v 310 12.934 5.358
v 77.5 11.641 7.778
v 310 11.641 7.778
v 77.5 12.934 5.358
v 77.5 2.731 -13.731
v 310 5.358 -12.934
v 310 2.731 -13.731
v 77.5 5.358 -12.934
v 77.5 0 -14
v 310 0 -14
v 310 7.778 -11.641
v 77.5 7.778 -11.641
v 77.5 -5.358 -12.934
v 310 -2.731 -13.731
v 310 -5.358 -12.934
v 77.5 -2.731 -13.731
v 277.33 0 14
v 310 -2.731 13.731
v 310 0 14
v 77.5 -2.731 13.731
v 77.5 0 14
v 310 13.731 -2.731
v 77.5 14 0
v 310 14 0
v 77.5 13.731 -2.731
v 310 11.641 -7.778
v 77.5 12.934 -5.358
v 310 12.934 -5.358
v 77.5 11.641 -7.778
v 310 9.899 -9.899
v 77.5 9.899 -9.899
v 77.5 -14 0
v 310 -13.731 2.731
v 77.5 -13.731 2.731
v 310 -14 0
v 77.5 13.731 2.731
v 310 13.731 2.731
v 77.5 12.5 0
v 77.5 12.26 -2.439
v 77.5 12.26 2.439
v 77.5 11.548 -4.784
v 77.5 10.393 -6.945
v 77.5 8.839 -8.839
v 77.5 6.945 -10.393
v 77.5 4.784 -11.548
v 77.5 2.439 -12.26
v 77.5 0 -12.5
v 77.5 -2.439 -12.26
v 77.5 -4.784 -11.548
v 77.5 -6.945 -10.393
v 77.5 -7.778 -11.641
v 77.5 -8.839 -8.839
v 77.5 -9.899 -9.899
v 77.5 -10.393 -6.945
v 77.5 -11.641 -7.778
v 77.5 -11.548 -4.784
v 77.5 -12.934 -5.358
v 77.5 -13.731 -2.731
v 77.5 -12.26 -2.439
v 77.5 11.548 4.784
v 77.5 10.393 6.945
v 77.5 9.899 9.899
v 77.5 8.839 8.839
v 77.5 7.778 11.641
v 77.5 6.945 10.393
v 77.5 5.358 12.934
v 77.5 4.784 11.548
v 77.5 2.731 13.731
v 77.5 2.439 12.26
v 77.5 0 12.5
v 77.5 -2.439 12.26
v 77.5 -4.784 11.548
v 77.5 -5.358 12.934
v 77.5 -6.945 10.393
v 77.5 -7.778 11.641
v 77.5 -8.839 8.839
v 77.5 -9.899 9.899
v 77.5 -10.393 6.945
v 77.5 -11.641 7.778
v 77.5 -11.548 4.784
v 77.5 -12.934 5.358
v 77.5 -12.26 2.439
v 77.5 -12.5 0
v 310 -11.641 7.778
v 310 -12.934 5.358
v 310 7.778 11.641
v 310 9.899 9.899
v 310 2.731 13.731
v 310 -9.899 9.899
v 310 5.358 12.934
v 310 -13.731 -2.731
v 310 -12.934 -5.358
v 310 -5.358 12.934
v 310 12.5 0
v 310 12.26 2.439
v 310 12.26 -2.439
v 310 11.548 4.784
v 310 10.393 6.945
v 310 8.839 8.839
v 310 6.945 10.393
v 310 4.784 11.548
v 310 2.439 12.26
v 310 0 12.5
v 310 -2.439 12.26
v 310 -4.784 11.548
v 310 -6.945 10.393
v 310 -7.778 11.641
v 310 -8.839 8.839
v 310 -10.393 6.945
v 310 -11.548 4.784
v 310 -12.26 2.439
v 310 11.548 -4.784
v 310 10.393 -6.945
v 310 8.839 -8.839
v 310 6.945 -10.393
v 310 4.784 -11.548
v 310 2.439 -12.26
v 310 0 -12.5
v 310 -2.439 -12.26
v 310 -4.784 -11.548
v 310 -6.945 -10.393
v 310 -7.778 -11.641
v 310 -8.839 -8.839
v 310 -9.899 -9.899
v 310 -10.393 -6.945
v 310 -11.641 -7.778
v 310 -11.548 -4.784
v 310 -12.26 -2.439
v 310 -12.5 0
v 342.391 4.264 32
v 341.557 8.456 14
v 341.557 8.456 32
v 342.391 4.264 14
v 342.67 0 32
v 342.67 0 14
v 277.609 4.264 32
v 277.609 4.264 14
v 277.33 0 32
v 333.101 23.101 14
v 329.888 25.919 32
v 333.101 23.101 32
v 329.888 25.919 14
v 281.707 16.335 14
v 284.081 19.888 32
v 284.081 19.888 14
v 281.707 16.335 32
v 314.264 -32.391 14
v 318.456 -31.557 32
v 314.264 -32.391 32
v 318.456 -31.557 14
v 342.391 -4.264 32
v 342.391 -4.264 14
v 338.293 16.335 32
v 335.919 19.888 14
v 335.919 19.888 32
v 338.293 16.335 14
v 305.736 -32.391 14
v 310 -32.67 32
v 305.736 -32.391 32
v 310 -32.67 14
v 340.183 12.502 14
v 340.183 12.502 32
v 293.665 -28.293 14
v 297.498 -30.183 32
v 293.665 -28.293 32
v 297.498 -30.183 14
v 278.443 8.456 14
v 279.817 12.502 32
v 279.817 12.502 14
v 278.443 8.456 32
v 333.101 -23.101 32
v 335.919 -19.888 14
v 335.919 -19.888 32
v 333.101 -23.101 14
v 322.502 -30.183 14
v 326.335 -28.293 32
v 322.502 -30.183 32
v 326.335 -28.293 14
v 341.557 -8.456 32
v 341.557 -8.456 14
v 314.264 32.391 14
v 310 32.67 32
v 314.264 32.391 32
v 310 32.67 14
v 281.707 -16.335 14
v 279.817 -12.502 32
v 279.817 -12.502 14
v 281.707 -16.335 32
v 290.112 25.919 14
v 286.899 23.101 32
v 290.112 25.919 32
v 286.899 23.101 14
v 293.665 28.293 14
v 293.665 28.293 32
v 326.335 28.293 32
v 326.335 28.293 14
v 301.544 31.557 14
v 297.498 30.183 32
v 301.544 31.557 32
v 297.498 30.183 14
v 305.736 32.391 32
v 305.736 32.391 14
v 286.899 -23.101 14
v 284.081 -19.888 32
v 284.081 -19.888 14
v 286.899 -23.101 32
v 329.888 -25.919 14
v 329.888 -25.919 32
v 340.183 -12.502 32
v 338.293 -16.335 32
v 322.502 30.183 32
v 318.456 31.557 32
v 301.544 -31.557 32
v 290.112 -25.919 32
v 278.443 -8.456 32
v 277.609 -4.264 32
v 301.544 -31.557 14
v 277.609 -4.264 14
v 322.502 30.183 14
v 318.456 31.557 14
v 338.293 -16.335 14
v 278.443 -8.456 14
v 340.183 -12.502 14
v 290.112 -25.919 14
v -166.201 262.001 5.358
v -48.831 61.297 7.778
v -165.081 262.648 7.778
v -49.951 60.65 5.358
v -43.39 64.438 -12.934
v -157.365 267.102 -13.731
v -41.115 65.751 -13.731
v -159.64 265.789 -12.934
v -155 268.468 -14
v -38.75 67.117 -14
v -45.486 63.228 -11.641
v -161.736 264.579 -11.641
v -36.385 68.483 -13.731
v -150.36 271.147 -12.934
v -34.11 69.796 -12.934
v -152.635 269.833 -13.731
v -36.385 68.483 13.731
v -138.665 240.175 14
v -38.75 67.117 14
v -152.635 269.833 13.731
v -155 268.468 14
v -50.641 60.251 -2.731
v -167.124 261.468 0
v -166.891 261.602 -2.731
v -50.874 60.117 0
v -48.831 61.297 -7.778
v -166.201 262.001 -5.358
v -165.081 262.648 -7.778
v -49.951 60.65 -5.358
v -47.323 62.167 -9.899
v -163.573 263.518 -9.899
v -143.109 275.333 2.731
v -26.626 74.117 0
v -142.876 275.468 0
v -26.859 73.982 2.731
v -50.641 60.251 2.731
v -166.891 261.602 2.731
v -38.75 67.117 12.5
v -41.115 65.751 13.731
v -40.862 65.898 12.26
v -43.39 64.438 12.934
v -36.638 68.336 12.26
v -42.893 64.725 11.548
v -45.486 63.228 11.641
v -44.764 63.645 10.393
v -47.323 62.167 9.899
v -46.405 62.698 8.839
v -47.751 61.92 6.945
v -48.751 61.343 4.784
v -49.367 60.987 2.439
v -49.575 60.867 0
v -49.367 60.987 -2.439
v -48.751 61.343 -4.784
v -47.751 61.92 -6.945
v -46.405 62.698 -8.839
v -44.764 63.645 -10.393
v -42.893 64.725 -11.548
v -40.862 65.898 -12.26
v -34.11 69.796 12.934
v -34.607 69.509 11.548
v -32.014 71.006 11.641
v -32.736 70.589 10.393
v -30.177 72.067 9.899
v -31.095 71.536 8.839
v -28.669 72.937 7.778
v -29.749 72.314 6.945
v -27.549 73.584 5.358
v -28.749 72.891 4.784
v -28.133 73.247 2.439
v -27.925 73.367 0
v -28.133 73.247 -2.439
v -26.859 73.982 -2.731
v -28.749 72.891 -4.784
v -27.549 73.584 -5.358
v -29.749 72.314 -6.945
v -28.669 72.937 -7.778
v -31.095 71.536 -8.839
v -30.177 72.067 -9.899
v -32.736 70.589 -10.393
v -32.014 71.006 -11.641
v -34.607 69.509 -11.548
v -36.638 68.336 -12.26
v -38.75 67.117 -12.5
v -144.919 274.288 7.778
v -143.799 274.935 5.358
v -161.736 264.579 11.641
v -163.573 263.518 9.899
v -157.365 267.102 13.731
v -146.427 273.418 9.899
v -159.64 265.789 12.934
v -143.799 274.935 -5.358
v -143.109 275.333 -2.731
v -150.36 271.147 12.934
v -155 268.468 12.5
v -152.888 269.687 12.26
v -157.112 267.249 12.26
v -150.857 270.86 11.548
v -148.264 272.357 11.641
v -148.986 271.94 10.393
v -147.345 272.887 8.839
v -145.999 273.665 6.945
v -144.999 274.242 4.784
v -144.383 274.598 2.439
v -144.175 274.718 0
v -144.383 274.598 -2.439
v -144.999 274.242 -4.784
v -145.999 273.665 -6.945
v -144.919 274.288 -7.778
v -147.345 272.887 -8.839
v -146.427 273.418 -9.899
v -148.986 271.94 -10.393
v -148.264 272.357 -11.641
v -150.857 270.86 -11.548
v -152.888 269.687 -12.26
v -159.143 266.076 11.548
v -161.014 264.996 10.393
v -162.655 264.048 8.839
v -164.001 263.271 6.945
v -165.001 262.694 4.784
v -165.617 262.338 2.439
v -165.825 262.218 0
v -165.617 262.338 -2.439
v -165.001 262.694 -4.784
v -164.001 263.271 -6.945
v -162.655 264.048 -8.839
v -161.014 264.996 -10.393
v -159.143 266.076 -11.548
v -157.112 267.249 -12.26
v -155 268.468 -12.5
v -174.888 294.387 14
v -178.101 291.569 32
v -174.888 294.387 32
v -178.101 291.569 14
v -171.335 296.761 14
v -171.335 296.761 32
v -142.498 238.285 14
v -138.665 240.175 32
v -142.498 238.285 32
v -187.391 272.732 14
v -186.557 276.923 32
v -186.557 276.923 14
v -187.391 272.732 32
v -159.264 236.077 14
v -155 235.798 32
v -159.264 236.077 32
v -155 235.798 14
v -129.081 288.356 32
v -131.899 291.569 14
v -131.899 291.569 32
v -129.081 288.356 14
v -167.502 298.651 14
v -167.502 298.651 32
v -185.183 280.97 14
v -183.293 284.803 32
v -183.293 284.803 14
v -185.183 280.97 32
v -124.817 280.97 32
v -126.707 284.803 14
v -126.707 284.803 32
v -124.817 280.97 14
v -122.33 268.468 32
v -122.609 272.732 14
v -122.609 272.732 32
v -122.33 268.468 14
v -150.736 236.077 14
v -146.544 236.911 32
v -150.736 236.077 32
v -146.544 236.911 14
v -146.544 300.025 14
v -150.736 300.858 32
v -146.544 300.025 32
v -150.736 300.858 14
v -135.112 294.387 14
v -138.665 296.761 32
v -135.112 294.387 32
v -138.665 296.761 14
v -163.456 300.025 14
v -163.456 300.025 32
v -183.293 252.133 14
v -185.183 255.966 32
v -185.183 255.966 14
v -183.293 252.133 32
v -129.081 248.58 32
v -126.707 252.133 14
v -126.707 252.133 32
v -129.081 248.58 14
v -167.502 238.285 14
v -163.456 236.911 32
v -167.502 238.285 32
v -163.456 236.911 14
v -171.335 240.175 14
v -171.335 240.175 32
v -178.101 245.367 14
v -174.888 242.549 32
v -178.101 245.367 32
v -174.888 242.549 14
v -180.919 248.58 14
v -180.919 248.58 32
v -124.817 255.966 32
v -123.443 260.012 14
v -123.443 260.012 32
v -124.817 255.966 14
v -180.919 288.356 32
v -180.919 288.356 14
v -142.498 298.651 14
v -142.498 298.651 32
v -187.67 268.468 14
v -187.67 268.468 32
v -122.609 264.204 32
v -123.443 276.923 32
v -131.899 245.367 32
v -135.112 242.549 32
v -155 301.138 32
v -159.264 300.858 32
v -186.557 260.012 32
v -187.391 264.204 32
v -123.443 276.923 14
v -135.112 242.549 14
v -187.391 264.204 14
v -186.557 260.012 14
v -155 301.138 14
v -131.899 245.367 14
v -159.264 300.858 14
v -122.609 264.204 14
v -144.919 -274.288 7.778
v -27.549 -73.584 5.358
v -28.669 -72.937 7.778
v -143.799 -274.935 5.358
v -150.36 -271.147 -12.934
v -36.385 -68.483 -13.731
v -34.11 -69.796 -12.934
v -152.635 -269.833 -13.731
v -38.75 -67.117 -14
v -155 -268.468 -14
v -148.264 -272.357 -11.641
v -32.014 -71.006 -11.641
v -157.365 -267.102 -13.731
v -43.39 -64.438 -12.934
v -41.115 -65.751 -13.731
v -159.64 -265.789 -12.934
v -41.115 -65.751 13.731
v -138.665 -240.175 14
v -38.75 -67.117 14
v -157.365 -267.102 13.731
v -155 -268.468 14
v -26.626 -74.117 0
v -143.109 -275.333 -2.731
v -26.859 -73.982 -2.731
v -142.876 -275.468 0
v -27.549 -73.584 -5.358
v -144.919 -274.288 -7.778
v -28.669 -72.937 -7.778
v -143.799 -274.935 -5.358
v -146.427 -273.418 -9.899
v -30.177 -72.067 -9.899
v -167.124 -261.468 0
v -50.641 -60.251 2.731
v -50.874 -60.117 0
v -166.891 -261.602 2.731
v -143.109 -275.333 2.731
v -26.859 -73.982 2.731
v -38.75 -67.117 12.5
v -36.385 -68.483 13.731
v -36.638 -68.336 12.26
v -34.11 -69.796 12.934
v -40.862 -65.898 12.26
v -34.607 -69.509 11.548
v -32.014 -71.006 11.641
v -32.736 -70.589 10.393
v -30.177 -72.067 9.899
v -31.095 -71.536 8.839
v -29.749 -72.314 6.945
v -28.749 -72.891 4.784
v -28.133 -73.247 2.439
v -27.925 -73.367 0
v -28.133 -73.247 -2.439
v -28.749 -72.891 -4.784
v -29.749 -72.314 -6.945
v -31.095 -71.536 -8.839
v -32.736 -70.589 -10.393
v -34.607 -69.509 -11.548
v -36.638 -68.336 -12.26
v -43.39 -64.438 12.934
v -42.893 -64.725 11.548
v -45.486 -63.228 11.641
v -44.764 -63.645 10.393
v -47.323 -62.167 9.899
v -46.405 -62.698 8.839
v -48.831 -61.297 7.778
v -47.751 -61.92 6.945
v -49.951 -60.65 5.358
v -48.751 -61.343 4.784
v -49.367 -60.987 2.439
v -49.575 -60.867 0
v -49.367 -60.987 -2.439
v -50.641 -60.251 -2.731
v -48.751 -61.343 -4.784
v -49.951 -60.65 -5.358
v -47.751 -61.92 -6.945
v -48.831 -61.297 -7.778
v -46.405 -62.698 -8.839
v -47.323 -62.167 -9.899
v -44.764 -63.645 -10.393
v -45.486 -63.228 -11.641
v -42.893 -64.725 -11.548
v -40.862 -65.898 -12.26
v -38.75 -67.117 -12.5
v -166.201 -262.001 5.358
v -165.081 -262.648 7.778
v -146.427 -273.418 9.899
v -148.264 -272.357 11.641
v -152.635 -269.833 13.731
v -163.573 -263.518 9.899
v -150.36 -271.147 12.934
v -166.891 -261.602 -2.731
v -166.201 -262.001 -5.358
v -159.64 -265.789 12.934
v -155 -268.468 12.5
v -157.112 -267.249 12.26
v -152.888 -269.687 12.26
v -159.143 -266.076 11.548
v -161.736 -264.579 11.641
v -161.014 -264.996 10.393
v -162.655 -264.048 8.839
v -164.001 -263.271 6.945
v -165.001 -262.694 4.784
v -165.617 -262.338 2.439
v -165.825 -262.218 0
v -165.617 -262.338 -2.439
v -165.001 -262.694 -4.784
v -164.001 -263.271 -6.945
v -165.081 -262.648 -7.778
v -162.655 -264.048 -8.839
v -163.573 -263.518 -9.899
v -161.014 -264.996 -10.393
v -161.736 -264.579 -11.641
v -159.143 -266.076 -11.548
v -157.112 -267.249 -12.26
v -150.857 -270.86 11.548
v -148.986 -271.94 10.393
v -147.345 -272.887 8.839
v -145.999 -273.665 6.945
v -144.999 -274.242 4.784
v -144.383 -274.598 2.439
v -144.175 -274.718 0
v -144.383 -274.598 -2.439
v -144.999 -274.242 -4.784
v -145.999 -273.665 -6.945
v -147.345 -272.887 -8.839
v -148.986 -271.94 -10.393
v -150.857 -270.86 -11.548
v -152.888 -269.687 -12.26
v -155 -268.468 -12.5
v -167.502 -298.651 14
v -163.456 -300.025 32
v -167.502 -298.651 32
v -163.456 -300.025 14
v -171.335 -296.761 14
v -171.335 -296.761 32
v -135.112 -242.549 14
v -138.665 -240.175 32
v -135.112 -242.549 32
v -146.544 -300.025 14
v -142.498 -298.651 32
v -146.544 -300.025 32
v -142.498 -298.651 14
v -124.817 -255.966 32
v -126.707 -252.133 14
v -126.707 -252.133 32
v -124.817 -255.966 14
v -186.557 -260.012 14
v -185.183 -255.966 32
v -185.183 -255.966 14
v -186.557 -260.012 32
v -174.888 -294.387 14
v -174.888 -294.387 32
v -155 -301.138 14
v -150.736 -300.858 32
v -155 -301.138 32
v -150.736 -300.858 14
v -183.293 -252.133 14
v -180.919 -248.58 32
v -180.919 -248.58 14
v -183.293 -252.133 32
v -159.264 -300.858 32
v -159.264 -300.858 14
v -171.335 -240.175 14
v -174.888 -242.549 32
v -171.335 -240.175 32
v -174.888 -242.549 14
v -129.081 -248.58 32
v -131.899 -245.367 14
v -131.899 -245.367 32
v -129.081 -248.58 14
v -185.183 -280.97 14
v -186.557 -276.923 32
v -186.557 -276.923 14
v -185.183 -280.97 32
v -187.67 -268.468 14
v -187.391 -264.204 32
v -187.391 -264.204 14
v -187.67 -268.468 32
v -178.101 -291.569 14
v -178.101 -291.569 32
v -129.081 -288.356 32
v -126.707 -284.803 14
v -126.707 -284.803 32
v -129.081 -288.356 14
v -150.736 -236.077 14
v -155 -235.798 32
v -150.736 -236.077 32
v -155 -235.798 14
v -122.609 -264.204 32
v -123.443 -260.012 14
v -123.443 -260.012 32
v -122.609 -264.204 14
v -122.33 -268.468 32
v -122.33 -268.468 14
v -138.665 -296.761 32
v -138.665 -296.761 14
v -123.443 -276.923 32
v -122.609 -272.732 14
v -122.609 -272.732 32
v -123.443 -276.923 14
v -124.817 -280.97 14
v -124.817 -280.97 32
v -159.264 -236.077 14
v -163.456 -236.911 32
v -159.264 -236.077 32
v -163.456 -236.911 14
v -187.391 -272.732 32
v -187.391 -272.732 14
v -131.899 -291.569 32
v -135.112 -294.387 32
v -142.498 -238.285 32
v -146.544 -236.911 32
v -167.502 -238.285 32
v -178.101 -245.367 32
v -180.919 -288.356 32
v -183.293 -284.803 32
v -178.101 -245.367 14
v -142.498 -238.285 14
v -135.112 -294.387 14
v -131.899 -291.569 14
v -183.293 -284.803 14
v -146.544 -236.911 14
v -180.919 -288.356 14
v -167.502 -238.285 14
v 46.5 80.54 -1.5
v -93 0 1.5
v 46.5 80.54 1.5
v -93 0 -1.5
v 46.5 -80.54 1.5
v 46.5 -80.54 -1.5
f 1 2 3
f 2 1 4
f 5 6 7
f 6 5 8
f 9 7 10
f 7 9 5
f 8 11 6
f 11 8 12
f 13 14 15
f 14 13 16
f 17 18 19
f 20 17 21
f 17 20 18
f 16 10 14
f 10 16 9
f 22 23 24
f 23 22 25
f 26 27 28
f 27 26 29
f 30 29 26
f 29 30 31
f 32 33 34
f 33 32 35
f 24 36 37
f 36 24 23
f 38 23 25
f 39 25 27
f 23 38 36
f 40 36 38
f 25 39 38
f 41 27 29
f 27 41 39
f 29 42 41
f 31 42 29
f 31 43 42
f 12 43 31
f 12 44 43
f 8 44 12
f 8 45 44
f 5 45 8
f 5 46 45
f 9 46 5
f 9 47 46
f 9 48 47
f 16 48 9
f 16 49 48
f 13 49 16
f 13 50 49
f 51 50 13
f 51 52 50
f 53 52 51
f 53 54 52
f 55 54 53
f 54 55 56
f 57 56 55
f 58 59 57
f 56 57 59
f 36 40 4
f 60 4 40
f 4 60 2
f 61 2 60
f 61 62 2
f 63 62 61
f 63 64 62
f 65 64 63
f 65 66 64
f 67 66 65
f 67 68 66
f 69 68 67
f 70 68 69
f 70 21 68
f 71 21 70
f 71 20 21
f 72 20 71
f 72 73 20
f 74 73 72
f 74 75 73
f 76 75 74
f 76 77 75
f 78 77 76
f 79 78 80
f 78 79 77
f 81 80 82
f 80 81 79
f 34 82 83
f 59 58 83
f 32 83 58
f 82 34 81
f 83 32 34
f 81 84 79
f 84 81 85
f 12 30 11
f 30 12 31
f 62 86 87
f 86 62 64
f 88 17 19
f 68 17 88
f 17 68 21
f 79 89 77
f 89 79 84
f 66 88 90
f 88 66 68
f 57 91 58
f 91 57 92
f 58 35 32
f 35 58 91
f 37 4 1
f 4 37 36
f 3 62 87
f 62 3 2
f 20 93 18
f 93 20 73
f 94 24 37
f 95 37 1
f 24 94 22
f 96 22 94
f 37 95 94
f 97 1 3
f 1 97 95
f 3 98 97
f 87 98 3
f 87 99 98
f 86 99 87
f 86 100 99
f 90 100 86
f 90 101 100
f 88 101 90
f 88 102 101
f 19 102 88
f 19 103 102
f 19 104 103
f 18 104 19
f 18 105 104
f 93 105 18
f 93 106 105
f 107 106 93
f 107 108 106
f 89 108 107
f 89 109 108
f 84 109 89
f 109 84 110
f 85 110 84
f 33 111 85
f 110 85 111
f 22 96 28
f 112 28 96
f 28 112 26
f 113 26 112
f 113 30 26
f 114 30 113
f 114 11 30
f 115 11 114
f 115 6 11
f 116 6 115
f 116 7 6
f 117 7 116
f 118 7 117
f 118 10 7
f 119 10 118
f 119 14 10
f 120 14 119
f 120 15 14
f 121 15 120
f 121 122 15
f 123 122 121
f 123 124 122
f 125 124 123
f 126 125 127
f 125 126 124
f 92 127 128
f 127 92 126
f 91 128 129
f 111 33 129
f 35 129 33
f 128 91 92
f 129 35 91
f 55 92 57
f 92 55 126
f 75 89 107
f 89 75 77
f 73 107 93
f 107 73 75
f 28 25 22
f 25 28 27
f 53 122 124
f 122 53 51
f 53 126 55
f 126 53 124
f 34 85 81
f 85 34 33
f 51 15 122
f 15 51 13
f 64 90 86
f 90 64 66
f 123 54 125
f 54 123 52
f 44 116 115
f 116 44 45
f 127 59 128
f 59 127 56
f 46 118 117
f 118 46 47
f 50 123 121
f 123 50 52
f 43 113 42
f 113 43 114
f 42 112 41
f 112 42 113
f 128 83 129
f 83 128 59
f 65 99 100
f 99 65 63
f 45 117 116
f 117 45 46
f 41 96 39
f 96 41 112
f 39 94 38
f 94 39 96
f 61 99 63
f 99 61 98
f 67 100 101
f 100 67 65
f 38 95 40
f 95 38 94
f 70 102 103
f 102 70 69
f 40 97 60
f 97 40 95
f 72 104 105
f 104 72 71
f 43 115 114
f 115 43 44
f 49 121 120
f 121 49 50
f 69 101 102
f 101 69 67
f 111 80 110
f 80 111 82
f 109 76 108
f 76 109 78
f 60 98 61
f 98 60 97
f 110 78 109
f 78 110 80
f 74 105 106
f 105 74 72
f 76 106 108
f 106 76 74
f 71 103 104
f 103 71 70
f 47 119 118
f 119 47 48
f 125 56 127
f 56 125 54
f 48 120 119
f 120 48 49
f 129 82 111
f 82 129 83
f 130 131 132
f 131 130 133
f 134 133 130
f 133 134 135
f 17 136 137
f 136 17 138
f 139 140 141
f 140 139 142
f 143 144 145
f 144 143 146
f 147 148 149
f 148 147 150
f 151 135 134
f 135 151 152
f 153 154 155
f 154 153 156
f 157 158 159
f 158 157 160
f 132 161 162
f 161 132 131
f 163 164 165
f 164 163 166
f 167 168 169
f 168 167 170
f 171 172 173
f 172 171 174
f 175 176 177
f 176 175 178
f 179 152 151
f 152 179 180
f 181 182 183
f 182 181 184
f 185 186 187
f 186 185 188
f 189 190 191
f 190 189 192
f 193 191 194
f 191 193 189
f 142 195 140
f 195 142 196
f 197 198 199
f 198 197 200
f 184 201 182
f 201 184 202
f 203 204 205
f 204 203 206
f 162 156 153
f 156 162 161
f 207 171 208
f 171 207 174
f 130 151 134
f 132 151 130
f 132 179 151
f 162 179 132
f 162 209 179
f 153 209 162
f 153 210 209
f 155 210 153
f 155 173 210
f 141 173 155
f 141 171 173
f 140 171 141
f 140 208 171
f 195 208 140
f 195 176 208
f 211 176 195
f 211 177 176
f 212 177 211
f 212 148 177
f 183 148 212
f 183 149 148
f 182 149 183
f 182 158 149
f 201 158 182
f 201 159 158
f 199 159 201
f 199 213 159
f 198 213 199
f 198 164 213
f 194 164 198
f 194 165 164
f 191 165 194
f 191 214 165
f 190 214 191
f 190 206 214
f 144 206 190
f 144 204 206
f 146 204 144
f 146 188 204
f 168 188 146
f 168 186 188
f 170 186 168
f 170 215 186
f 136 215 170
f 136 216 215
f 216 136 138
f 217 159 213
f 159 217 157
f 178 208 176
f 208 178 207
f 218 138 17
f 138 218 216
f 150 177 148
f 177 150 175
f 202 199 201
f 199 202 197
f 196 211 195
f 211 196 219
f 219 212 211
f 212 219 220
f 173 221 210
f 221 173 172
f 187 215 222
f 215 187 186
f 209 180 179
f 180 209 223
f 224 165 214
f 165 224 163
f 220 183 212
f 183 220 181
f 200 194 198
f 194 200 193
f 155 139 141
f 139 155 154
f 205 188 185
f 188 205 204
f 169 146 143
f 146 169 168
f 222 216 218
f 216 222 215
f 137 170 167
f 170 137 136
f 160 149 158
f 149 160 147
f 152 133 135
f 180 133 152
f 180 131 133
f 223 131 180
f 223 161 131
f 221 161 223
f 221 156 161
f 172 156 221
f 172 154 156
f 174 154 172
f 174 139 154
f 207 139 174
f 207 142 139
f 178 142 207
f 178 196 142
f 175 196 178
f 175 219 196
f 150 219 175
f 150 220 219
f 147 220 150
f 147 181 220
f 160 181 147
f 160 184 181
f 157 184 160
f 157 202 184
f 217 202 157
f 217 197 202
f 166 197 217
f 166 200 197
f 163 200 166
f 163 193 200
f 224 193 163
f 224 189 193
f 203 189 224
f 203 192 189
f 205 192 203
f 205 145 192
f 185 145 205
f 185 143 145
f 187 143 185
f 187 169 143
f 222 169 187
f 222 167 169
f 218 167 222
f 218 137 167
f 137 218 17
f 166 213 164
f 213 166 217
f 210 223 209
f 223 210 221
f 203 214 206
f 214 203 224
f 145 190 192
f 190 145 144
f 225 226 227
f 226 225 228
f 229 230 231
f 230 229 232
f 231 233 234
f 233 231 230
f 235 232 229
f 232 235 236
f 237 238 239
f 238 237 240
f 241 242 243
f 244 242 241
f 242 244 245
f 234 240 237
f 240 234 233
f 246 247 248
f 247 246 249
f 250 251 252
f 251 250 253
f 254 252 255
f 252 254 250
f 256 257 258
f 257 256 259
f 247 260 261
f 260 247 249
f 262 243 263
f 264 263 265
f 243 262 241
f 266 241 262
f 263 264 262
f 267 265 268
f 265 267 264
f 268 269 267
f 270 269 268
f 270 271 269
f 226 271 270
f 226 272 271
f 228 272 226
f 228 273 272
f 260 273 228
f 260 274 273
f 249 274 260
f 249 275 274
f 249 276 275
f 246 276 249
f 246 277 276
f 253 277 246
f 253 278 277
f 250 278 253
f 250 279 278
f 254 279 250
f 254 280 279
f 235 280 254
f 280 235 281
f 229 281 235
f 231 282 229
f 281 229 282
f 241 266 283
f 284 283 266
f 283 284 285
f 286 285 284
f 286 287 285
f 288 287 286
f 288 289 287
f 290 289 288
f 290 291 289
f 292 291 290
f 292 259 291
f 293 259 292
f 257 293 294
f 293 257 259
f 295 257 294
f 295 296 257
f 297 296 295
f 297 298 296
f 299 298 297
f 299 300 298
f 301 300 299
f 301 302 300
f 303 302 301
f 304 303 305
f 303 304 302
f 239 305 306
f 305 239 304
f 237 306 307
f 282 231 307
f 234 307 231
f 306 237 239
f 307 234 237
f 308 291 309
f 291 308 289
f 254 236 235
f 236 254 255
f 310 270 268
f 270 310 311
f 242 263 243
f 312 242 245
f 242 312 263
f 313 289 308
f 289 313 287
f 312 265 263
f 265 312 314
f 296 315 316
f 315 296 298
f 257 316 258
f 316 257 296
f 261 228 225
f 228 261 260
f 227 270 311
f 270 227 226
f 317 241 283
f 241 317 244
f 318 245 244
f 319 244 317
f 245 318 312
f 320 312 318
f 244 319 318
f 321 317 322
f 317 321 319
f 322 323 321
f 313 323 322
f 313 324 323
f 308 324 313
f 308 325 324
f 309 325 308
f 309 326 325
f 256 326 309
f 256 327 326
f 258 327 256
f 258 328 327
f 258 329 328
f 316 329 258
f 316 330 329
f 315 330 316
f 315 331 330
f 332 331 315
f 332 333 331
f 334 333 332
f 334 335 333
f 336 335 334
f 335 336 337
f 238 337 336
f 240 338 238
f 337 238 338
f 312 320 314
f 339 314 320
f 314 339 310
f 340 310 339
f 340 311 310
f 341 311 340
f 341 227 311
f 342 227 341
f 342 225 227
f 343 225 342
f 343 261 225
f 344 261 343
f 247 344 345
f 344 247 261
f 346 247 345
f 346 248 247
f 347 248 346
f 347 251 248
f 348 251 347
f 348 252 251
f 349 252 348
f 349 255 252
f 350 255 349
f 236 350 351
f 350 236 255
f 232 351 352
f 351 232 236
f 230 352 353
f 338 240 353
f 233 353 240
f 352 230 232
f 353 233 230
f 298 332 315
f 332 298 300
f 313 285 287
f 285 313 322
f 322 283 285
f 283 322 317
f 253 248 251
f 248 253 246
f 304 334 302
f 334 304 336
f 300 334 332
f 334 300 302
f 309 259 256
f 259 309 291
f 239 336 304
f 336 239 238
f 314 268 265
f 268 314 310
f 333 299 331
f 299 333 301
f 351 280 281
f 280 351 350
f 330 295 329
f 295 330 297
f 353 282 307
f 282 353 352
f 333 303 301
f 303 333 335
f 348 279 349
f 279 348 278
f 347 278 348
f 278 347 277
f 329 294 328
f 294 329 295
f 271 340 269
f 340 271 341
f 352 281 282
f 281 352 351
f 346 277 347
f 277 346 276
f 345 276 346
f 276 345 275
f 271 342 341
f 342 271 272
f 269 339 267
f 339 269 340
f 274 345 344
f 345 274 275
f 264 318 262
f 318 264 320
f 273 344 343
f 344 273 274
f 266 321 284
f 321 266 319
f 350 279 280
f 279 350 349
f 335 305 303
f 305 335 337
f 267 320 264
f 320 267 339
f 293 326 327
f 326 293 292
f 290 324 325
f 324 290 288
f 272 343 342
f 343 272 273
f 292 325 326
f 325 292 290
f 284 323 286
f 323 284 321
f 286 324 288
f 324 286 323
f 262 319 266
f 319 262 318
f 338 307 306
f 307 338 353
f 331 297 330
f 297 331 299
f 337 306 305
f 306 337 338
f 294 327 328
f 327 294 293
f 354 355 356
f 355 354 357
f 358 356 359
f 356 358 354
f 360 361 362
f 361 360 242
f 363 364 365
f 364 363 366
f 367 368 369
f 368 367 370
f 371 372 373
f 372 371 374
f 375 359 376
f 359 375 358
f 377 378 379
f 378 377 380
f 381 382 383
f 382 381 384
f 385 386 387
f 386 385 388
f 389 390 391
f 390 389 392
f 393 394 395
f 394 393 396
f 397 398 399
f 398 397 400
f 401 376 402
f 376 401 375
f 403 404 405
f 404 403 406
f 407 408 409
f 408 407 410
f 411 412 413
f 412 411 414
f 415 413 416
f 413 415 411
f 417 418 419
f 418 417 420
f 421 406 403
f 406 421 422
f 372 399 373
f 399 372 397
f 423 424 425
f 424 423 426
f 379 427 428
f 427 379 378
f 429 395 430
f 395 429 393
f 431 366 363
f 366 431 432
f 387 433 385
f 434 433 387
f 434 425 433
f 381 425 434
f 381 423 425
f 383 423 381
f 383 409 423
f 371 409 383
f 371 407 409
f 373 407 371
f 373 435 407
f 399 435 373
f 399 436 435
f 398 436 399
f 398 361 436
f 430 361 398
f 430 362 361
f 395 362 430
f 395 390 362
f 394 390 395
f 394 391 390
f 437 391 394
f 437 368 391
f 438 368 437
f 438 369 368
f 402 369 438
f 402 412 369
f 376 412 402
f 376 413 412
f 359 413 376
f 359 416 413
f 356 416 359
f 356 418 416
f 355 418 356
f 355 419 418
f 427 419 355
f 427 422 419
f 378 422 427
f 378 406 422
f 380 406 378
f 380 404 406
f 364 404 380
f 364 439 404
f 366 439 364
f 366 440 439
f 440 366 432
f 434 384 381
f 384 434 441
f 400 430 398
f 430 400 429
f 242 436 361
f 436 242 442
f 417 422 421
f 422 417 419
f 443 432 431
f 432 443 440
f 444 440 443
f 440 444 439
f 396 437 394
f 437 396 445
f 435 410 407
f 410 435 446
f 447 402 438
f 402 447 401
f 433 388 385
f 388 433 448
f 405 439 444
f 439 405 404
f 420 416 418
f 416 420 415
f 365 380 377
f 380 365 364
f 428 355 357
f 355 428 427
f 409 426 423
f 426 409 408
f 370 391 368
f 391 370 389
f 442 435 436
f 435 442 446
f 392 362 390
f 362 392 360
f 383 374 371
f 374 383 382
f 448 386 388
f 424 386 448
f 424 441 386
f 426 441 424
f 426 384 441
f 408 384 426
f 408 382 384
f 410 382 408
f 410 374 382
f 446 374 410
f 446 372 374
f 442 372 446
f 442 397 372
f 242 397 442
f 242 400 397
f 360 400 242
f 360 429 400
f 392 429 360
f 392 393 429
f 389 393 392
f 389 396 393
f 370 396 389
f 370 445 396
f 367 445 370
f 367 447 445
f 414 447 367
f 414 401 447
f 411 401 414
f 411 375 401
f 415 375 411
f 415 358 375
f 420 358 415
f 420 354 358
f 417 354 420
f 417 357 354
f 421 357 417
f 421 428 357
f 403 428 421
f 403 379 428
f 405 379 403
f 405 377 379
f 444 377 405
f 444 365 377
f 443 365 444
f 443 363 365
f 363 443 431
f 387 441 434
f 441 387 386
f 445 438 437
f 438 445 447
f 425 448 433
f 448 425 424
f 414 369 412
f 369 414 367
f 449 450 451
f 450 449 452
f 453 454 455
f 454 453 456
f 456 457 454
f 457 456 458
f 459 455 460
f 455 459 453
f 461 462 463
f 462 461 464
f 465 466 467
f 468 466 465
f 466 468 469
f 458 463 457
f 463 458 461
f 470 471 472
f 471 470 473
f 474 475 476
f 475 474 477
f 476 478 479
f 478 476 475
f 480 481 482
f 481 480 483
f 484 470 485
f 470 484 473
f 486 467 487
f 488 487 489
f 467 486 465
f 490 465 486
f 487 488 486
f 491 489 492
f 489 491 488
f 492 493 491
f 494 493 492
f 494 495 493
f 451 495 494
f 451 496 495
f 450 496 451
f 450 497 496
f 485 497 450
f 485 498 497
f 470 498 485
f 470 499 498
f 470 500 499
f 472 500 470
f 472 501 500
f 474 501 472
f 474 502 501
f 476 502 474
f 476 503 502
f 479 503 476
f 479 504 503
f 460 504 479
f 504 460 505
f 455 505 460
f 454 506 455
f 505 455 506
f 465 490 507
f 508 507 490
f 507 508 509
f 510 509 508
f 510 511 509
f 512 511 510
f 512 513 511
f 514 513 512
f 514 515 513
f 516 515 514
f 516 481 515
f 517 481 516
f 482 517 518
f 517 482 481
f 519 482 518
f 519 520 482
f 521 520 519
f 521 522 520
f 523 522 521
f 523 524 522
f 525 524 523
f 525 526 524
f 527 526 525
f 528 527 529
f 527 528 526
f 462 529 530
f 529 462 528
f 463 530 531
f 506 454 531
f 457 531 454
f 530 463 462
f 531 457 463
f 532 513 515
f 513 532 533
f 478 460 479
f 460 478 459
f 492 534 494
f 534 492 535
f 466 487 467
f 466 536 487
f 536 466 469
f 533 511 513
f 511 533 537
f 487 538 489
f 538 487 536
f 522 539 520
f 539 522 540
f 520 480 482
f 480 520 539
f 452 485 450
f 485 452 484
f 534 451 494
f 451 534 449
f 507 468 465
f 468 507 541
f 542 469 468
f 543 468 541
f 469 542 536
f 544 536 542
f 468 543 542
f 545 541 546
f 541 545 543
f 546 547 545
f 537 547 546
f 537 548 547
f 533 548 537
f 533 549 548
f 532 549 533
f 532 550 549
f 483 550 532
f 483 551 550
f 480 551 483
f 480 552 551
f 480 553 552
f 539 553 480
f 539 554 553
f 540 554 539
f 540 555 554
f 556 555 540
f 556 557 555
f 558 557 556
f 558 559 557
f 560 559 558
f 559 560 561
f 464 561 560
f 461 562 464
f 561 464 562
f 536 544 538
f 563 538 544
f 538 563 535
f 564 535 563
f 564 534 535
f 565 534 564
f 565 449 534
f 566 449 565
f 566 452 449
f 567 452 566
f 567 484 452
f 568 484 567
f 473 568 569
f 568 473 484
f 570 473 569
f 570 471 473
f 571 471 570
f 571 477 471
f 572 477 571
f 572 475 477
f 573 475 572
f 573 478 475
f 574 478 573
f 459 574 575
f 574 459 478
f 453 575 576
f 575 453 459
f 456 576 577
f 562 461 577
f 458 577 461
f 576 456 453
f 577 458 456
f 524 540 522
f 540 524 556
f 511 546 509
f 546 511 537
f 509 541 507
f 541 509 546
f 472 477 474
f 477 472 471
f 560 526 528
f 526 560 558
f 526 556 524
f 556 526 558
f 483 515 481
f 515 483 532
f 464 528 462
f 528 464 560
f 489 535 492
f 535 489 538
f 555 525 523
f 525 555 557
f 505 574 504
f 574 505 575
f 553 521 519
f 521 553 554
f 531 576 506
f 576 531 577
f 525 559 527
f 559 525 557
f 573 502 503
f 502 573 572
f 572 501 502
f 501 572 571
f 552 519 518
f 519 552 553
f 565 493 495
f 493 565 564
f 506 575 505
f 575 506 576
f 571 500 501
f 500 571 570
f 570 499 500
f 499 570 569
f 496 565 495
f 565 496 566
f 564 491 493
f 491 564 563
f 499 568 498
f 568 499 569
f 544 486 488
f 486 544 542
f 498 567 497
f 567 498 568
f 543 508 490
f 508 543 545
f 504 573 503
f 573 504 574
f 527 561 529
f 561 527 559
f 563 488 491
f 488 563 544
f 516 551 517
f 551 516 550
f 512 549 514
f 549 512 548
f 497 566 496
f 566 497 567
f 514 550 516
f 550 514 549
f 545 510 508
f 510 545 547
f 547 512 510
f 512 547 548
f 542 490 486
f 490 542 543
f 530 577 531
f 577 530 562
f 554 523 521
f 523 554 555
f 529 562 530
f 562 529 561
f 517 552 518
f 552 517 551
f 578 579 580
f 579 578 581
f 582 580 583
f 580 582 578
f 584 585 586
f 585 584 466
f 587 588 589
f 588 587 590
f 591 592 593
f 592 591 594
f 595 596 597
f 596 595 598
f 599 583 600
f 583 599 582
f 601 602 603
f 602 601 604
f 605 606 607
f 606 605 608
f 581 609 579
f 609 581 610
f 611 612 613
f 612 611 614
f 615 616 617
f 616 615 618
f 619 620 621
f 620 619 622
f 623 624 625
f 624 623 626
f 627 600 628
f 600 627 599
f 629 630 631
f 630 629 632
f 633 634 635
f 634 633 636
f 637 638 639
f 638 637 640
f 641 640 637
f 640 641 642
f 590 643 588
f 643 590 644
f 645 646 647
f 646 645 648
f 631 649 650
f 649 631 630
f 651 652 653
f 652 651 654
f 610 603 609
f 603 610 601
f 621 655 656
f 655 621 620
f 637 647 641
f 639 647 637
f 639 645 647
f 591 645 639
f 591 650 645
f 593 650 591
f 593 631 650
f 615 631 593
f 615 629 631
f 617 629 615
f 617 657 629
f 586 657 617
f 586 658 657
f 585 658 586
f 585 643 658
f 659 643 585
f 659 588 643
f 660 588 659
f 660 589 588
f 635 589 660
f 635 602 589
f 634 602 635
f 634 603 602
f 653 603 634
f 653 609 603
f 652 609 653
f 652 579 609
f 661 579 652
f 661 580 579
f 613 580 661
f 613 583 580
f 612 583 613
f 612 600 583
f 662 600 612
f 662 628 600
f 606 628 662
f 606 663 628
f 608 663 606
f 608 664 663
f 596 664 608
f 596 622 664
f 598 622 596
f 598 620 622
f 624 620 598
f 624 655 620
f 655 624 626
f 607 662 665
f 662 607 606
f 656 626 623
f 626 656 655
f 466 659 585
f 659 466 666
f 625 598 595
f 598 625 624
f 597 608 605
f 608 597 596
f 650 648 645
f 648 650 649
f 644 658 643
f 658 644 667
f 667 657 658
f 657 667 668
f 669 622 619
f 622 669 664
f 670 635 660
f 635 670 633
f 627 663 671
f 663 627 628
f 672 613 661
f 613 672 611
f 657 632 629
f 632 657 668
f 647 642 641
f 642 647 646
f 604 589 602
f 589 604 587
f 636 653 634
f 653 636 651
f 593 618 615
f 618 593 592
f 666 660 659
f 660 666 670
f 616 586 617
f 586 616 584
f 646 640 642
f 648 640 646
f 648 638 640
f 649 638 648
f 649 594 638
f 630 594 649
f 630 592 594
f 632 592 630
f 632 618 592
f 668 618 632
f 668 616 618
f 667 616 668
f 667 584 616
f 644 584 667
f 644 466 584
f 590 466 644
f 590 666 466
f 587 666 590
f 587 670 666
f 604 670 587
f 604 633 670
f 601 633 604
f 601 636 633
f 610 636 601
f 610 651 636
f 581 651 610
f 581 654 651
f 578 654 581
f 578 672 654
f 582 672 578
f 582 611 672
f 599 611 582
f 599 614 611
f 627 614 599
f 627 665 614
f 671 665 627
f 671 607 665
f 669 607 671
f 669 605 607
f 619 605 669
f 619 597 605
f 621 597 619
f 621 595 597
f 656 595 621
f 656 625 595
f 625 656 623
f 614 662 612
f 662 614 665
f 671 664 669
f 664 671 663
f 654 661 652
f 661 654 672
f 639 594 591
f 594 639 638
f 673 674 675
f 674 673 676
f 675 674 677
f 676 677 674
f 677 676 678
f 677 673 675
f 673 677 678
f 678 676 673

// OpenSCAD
// Generated by SHIVA-1 cad_generator - parametric OpenSCAD model
// Units: millimetres.
// domain: drone_frame
// material: Aluminium 6061-T6
n_arms = 3;
arm_length = 310;
arm_od = 28;
arm_wall = 1.5;
prop_diameter = 381;
plate_r = 93;
plate_t = 3;
show_props = false;
union() {
  rotate([0, 0, 180 / n_arms]) cylinder(r = plate_r, h = plate_t, center = true, $fn = n_arms);
  for (k = [0 : n_arms - 1]) rotate([0, 0, 360 * k / n_arms]) {
    translate([0.25 * arm_length, 0, 0]) rotate([0, 90, 0])
      difference() { cylinder(d = arm_od, h = 0.75 * arm_length, $fn = 32); translate([0, 0, -1]) cylinder(d = arm_od - 2 * arm_wall, h = arm_length, $fn = 32); }
    translate([arm_length, 0, arm_od / 2]) cylinder(r = 0.07 * prop_diameter + 6, h = 18, $fn = 48);
    if (show_props) %translate([arm_length, 0, arm_od / 2 + 20]) cylinder(d = prop_diameter, h = 1, $fn = 96);
  }
}
